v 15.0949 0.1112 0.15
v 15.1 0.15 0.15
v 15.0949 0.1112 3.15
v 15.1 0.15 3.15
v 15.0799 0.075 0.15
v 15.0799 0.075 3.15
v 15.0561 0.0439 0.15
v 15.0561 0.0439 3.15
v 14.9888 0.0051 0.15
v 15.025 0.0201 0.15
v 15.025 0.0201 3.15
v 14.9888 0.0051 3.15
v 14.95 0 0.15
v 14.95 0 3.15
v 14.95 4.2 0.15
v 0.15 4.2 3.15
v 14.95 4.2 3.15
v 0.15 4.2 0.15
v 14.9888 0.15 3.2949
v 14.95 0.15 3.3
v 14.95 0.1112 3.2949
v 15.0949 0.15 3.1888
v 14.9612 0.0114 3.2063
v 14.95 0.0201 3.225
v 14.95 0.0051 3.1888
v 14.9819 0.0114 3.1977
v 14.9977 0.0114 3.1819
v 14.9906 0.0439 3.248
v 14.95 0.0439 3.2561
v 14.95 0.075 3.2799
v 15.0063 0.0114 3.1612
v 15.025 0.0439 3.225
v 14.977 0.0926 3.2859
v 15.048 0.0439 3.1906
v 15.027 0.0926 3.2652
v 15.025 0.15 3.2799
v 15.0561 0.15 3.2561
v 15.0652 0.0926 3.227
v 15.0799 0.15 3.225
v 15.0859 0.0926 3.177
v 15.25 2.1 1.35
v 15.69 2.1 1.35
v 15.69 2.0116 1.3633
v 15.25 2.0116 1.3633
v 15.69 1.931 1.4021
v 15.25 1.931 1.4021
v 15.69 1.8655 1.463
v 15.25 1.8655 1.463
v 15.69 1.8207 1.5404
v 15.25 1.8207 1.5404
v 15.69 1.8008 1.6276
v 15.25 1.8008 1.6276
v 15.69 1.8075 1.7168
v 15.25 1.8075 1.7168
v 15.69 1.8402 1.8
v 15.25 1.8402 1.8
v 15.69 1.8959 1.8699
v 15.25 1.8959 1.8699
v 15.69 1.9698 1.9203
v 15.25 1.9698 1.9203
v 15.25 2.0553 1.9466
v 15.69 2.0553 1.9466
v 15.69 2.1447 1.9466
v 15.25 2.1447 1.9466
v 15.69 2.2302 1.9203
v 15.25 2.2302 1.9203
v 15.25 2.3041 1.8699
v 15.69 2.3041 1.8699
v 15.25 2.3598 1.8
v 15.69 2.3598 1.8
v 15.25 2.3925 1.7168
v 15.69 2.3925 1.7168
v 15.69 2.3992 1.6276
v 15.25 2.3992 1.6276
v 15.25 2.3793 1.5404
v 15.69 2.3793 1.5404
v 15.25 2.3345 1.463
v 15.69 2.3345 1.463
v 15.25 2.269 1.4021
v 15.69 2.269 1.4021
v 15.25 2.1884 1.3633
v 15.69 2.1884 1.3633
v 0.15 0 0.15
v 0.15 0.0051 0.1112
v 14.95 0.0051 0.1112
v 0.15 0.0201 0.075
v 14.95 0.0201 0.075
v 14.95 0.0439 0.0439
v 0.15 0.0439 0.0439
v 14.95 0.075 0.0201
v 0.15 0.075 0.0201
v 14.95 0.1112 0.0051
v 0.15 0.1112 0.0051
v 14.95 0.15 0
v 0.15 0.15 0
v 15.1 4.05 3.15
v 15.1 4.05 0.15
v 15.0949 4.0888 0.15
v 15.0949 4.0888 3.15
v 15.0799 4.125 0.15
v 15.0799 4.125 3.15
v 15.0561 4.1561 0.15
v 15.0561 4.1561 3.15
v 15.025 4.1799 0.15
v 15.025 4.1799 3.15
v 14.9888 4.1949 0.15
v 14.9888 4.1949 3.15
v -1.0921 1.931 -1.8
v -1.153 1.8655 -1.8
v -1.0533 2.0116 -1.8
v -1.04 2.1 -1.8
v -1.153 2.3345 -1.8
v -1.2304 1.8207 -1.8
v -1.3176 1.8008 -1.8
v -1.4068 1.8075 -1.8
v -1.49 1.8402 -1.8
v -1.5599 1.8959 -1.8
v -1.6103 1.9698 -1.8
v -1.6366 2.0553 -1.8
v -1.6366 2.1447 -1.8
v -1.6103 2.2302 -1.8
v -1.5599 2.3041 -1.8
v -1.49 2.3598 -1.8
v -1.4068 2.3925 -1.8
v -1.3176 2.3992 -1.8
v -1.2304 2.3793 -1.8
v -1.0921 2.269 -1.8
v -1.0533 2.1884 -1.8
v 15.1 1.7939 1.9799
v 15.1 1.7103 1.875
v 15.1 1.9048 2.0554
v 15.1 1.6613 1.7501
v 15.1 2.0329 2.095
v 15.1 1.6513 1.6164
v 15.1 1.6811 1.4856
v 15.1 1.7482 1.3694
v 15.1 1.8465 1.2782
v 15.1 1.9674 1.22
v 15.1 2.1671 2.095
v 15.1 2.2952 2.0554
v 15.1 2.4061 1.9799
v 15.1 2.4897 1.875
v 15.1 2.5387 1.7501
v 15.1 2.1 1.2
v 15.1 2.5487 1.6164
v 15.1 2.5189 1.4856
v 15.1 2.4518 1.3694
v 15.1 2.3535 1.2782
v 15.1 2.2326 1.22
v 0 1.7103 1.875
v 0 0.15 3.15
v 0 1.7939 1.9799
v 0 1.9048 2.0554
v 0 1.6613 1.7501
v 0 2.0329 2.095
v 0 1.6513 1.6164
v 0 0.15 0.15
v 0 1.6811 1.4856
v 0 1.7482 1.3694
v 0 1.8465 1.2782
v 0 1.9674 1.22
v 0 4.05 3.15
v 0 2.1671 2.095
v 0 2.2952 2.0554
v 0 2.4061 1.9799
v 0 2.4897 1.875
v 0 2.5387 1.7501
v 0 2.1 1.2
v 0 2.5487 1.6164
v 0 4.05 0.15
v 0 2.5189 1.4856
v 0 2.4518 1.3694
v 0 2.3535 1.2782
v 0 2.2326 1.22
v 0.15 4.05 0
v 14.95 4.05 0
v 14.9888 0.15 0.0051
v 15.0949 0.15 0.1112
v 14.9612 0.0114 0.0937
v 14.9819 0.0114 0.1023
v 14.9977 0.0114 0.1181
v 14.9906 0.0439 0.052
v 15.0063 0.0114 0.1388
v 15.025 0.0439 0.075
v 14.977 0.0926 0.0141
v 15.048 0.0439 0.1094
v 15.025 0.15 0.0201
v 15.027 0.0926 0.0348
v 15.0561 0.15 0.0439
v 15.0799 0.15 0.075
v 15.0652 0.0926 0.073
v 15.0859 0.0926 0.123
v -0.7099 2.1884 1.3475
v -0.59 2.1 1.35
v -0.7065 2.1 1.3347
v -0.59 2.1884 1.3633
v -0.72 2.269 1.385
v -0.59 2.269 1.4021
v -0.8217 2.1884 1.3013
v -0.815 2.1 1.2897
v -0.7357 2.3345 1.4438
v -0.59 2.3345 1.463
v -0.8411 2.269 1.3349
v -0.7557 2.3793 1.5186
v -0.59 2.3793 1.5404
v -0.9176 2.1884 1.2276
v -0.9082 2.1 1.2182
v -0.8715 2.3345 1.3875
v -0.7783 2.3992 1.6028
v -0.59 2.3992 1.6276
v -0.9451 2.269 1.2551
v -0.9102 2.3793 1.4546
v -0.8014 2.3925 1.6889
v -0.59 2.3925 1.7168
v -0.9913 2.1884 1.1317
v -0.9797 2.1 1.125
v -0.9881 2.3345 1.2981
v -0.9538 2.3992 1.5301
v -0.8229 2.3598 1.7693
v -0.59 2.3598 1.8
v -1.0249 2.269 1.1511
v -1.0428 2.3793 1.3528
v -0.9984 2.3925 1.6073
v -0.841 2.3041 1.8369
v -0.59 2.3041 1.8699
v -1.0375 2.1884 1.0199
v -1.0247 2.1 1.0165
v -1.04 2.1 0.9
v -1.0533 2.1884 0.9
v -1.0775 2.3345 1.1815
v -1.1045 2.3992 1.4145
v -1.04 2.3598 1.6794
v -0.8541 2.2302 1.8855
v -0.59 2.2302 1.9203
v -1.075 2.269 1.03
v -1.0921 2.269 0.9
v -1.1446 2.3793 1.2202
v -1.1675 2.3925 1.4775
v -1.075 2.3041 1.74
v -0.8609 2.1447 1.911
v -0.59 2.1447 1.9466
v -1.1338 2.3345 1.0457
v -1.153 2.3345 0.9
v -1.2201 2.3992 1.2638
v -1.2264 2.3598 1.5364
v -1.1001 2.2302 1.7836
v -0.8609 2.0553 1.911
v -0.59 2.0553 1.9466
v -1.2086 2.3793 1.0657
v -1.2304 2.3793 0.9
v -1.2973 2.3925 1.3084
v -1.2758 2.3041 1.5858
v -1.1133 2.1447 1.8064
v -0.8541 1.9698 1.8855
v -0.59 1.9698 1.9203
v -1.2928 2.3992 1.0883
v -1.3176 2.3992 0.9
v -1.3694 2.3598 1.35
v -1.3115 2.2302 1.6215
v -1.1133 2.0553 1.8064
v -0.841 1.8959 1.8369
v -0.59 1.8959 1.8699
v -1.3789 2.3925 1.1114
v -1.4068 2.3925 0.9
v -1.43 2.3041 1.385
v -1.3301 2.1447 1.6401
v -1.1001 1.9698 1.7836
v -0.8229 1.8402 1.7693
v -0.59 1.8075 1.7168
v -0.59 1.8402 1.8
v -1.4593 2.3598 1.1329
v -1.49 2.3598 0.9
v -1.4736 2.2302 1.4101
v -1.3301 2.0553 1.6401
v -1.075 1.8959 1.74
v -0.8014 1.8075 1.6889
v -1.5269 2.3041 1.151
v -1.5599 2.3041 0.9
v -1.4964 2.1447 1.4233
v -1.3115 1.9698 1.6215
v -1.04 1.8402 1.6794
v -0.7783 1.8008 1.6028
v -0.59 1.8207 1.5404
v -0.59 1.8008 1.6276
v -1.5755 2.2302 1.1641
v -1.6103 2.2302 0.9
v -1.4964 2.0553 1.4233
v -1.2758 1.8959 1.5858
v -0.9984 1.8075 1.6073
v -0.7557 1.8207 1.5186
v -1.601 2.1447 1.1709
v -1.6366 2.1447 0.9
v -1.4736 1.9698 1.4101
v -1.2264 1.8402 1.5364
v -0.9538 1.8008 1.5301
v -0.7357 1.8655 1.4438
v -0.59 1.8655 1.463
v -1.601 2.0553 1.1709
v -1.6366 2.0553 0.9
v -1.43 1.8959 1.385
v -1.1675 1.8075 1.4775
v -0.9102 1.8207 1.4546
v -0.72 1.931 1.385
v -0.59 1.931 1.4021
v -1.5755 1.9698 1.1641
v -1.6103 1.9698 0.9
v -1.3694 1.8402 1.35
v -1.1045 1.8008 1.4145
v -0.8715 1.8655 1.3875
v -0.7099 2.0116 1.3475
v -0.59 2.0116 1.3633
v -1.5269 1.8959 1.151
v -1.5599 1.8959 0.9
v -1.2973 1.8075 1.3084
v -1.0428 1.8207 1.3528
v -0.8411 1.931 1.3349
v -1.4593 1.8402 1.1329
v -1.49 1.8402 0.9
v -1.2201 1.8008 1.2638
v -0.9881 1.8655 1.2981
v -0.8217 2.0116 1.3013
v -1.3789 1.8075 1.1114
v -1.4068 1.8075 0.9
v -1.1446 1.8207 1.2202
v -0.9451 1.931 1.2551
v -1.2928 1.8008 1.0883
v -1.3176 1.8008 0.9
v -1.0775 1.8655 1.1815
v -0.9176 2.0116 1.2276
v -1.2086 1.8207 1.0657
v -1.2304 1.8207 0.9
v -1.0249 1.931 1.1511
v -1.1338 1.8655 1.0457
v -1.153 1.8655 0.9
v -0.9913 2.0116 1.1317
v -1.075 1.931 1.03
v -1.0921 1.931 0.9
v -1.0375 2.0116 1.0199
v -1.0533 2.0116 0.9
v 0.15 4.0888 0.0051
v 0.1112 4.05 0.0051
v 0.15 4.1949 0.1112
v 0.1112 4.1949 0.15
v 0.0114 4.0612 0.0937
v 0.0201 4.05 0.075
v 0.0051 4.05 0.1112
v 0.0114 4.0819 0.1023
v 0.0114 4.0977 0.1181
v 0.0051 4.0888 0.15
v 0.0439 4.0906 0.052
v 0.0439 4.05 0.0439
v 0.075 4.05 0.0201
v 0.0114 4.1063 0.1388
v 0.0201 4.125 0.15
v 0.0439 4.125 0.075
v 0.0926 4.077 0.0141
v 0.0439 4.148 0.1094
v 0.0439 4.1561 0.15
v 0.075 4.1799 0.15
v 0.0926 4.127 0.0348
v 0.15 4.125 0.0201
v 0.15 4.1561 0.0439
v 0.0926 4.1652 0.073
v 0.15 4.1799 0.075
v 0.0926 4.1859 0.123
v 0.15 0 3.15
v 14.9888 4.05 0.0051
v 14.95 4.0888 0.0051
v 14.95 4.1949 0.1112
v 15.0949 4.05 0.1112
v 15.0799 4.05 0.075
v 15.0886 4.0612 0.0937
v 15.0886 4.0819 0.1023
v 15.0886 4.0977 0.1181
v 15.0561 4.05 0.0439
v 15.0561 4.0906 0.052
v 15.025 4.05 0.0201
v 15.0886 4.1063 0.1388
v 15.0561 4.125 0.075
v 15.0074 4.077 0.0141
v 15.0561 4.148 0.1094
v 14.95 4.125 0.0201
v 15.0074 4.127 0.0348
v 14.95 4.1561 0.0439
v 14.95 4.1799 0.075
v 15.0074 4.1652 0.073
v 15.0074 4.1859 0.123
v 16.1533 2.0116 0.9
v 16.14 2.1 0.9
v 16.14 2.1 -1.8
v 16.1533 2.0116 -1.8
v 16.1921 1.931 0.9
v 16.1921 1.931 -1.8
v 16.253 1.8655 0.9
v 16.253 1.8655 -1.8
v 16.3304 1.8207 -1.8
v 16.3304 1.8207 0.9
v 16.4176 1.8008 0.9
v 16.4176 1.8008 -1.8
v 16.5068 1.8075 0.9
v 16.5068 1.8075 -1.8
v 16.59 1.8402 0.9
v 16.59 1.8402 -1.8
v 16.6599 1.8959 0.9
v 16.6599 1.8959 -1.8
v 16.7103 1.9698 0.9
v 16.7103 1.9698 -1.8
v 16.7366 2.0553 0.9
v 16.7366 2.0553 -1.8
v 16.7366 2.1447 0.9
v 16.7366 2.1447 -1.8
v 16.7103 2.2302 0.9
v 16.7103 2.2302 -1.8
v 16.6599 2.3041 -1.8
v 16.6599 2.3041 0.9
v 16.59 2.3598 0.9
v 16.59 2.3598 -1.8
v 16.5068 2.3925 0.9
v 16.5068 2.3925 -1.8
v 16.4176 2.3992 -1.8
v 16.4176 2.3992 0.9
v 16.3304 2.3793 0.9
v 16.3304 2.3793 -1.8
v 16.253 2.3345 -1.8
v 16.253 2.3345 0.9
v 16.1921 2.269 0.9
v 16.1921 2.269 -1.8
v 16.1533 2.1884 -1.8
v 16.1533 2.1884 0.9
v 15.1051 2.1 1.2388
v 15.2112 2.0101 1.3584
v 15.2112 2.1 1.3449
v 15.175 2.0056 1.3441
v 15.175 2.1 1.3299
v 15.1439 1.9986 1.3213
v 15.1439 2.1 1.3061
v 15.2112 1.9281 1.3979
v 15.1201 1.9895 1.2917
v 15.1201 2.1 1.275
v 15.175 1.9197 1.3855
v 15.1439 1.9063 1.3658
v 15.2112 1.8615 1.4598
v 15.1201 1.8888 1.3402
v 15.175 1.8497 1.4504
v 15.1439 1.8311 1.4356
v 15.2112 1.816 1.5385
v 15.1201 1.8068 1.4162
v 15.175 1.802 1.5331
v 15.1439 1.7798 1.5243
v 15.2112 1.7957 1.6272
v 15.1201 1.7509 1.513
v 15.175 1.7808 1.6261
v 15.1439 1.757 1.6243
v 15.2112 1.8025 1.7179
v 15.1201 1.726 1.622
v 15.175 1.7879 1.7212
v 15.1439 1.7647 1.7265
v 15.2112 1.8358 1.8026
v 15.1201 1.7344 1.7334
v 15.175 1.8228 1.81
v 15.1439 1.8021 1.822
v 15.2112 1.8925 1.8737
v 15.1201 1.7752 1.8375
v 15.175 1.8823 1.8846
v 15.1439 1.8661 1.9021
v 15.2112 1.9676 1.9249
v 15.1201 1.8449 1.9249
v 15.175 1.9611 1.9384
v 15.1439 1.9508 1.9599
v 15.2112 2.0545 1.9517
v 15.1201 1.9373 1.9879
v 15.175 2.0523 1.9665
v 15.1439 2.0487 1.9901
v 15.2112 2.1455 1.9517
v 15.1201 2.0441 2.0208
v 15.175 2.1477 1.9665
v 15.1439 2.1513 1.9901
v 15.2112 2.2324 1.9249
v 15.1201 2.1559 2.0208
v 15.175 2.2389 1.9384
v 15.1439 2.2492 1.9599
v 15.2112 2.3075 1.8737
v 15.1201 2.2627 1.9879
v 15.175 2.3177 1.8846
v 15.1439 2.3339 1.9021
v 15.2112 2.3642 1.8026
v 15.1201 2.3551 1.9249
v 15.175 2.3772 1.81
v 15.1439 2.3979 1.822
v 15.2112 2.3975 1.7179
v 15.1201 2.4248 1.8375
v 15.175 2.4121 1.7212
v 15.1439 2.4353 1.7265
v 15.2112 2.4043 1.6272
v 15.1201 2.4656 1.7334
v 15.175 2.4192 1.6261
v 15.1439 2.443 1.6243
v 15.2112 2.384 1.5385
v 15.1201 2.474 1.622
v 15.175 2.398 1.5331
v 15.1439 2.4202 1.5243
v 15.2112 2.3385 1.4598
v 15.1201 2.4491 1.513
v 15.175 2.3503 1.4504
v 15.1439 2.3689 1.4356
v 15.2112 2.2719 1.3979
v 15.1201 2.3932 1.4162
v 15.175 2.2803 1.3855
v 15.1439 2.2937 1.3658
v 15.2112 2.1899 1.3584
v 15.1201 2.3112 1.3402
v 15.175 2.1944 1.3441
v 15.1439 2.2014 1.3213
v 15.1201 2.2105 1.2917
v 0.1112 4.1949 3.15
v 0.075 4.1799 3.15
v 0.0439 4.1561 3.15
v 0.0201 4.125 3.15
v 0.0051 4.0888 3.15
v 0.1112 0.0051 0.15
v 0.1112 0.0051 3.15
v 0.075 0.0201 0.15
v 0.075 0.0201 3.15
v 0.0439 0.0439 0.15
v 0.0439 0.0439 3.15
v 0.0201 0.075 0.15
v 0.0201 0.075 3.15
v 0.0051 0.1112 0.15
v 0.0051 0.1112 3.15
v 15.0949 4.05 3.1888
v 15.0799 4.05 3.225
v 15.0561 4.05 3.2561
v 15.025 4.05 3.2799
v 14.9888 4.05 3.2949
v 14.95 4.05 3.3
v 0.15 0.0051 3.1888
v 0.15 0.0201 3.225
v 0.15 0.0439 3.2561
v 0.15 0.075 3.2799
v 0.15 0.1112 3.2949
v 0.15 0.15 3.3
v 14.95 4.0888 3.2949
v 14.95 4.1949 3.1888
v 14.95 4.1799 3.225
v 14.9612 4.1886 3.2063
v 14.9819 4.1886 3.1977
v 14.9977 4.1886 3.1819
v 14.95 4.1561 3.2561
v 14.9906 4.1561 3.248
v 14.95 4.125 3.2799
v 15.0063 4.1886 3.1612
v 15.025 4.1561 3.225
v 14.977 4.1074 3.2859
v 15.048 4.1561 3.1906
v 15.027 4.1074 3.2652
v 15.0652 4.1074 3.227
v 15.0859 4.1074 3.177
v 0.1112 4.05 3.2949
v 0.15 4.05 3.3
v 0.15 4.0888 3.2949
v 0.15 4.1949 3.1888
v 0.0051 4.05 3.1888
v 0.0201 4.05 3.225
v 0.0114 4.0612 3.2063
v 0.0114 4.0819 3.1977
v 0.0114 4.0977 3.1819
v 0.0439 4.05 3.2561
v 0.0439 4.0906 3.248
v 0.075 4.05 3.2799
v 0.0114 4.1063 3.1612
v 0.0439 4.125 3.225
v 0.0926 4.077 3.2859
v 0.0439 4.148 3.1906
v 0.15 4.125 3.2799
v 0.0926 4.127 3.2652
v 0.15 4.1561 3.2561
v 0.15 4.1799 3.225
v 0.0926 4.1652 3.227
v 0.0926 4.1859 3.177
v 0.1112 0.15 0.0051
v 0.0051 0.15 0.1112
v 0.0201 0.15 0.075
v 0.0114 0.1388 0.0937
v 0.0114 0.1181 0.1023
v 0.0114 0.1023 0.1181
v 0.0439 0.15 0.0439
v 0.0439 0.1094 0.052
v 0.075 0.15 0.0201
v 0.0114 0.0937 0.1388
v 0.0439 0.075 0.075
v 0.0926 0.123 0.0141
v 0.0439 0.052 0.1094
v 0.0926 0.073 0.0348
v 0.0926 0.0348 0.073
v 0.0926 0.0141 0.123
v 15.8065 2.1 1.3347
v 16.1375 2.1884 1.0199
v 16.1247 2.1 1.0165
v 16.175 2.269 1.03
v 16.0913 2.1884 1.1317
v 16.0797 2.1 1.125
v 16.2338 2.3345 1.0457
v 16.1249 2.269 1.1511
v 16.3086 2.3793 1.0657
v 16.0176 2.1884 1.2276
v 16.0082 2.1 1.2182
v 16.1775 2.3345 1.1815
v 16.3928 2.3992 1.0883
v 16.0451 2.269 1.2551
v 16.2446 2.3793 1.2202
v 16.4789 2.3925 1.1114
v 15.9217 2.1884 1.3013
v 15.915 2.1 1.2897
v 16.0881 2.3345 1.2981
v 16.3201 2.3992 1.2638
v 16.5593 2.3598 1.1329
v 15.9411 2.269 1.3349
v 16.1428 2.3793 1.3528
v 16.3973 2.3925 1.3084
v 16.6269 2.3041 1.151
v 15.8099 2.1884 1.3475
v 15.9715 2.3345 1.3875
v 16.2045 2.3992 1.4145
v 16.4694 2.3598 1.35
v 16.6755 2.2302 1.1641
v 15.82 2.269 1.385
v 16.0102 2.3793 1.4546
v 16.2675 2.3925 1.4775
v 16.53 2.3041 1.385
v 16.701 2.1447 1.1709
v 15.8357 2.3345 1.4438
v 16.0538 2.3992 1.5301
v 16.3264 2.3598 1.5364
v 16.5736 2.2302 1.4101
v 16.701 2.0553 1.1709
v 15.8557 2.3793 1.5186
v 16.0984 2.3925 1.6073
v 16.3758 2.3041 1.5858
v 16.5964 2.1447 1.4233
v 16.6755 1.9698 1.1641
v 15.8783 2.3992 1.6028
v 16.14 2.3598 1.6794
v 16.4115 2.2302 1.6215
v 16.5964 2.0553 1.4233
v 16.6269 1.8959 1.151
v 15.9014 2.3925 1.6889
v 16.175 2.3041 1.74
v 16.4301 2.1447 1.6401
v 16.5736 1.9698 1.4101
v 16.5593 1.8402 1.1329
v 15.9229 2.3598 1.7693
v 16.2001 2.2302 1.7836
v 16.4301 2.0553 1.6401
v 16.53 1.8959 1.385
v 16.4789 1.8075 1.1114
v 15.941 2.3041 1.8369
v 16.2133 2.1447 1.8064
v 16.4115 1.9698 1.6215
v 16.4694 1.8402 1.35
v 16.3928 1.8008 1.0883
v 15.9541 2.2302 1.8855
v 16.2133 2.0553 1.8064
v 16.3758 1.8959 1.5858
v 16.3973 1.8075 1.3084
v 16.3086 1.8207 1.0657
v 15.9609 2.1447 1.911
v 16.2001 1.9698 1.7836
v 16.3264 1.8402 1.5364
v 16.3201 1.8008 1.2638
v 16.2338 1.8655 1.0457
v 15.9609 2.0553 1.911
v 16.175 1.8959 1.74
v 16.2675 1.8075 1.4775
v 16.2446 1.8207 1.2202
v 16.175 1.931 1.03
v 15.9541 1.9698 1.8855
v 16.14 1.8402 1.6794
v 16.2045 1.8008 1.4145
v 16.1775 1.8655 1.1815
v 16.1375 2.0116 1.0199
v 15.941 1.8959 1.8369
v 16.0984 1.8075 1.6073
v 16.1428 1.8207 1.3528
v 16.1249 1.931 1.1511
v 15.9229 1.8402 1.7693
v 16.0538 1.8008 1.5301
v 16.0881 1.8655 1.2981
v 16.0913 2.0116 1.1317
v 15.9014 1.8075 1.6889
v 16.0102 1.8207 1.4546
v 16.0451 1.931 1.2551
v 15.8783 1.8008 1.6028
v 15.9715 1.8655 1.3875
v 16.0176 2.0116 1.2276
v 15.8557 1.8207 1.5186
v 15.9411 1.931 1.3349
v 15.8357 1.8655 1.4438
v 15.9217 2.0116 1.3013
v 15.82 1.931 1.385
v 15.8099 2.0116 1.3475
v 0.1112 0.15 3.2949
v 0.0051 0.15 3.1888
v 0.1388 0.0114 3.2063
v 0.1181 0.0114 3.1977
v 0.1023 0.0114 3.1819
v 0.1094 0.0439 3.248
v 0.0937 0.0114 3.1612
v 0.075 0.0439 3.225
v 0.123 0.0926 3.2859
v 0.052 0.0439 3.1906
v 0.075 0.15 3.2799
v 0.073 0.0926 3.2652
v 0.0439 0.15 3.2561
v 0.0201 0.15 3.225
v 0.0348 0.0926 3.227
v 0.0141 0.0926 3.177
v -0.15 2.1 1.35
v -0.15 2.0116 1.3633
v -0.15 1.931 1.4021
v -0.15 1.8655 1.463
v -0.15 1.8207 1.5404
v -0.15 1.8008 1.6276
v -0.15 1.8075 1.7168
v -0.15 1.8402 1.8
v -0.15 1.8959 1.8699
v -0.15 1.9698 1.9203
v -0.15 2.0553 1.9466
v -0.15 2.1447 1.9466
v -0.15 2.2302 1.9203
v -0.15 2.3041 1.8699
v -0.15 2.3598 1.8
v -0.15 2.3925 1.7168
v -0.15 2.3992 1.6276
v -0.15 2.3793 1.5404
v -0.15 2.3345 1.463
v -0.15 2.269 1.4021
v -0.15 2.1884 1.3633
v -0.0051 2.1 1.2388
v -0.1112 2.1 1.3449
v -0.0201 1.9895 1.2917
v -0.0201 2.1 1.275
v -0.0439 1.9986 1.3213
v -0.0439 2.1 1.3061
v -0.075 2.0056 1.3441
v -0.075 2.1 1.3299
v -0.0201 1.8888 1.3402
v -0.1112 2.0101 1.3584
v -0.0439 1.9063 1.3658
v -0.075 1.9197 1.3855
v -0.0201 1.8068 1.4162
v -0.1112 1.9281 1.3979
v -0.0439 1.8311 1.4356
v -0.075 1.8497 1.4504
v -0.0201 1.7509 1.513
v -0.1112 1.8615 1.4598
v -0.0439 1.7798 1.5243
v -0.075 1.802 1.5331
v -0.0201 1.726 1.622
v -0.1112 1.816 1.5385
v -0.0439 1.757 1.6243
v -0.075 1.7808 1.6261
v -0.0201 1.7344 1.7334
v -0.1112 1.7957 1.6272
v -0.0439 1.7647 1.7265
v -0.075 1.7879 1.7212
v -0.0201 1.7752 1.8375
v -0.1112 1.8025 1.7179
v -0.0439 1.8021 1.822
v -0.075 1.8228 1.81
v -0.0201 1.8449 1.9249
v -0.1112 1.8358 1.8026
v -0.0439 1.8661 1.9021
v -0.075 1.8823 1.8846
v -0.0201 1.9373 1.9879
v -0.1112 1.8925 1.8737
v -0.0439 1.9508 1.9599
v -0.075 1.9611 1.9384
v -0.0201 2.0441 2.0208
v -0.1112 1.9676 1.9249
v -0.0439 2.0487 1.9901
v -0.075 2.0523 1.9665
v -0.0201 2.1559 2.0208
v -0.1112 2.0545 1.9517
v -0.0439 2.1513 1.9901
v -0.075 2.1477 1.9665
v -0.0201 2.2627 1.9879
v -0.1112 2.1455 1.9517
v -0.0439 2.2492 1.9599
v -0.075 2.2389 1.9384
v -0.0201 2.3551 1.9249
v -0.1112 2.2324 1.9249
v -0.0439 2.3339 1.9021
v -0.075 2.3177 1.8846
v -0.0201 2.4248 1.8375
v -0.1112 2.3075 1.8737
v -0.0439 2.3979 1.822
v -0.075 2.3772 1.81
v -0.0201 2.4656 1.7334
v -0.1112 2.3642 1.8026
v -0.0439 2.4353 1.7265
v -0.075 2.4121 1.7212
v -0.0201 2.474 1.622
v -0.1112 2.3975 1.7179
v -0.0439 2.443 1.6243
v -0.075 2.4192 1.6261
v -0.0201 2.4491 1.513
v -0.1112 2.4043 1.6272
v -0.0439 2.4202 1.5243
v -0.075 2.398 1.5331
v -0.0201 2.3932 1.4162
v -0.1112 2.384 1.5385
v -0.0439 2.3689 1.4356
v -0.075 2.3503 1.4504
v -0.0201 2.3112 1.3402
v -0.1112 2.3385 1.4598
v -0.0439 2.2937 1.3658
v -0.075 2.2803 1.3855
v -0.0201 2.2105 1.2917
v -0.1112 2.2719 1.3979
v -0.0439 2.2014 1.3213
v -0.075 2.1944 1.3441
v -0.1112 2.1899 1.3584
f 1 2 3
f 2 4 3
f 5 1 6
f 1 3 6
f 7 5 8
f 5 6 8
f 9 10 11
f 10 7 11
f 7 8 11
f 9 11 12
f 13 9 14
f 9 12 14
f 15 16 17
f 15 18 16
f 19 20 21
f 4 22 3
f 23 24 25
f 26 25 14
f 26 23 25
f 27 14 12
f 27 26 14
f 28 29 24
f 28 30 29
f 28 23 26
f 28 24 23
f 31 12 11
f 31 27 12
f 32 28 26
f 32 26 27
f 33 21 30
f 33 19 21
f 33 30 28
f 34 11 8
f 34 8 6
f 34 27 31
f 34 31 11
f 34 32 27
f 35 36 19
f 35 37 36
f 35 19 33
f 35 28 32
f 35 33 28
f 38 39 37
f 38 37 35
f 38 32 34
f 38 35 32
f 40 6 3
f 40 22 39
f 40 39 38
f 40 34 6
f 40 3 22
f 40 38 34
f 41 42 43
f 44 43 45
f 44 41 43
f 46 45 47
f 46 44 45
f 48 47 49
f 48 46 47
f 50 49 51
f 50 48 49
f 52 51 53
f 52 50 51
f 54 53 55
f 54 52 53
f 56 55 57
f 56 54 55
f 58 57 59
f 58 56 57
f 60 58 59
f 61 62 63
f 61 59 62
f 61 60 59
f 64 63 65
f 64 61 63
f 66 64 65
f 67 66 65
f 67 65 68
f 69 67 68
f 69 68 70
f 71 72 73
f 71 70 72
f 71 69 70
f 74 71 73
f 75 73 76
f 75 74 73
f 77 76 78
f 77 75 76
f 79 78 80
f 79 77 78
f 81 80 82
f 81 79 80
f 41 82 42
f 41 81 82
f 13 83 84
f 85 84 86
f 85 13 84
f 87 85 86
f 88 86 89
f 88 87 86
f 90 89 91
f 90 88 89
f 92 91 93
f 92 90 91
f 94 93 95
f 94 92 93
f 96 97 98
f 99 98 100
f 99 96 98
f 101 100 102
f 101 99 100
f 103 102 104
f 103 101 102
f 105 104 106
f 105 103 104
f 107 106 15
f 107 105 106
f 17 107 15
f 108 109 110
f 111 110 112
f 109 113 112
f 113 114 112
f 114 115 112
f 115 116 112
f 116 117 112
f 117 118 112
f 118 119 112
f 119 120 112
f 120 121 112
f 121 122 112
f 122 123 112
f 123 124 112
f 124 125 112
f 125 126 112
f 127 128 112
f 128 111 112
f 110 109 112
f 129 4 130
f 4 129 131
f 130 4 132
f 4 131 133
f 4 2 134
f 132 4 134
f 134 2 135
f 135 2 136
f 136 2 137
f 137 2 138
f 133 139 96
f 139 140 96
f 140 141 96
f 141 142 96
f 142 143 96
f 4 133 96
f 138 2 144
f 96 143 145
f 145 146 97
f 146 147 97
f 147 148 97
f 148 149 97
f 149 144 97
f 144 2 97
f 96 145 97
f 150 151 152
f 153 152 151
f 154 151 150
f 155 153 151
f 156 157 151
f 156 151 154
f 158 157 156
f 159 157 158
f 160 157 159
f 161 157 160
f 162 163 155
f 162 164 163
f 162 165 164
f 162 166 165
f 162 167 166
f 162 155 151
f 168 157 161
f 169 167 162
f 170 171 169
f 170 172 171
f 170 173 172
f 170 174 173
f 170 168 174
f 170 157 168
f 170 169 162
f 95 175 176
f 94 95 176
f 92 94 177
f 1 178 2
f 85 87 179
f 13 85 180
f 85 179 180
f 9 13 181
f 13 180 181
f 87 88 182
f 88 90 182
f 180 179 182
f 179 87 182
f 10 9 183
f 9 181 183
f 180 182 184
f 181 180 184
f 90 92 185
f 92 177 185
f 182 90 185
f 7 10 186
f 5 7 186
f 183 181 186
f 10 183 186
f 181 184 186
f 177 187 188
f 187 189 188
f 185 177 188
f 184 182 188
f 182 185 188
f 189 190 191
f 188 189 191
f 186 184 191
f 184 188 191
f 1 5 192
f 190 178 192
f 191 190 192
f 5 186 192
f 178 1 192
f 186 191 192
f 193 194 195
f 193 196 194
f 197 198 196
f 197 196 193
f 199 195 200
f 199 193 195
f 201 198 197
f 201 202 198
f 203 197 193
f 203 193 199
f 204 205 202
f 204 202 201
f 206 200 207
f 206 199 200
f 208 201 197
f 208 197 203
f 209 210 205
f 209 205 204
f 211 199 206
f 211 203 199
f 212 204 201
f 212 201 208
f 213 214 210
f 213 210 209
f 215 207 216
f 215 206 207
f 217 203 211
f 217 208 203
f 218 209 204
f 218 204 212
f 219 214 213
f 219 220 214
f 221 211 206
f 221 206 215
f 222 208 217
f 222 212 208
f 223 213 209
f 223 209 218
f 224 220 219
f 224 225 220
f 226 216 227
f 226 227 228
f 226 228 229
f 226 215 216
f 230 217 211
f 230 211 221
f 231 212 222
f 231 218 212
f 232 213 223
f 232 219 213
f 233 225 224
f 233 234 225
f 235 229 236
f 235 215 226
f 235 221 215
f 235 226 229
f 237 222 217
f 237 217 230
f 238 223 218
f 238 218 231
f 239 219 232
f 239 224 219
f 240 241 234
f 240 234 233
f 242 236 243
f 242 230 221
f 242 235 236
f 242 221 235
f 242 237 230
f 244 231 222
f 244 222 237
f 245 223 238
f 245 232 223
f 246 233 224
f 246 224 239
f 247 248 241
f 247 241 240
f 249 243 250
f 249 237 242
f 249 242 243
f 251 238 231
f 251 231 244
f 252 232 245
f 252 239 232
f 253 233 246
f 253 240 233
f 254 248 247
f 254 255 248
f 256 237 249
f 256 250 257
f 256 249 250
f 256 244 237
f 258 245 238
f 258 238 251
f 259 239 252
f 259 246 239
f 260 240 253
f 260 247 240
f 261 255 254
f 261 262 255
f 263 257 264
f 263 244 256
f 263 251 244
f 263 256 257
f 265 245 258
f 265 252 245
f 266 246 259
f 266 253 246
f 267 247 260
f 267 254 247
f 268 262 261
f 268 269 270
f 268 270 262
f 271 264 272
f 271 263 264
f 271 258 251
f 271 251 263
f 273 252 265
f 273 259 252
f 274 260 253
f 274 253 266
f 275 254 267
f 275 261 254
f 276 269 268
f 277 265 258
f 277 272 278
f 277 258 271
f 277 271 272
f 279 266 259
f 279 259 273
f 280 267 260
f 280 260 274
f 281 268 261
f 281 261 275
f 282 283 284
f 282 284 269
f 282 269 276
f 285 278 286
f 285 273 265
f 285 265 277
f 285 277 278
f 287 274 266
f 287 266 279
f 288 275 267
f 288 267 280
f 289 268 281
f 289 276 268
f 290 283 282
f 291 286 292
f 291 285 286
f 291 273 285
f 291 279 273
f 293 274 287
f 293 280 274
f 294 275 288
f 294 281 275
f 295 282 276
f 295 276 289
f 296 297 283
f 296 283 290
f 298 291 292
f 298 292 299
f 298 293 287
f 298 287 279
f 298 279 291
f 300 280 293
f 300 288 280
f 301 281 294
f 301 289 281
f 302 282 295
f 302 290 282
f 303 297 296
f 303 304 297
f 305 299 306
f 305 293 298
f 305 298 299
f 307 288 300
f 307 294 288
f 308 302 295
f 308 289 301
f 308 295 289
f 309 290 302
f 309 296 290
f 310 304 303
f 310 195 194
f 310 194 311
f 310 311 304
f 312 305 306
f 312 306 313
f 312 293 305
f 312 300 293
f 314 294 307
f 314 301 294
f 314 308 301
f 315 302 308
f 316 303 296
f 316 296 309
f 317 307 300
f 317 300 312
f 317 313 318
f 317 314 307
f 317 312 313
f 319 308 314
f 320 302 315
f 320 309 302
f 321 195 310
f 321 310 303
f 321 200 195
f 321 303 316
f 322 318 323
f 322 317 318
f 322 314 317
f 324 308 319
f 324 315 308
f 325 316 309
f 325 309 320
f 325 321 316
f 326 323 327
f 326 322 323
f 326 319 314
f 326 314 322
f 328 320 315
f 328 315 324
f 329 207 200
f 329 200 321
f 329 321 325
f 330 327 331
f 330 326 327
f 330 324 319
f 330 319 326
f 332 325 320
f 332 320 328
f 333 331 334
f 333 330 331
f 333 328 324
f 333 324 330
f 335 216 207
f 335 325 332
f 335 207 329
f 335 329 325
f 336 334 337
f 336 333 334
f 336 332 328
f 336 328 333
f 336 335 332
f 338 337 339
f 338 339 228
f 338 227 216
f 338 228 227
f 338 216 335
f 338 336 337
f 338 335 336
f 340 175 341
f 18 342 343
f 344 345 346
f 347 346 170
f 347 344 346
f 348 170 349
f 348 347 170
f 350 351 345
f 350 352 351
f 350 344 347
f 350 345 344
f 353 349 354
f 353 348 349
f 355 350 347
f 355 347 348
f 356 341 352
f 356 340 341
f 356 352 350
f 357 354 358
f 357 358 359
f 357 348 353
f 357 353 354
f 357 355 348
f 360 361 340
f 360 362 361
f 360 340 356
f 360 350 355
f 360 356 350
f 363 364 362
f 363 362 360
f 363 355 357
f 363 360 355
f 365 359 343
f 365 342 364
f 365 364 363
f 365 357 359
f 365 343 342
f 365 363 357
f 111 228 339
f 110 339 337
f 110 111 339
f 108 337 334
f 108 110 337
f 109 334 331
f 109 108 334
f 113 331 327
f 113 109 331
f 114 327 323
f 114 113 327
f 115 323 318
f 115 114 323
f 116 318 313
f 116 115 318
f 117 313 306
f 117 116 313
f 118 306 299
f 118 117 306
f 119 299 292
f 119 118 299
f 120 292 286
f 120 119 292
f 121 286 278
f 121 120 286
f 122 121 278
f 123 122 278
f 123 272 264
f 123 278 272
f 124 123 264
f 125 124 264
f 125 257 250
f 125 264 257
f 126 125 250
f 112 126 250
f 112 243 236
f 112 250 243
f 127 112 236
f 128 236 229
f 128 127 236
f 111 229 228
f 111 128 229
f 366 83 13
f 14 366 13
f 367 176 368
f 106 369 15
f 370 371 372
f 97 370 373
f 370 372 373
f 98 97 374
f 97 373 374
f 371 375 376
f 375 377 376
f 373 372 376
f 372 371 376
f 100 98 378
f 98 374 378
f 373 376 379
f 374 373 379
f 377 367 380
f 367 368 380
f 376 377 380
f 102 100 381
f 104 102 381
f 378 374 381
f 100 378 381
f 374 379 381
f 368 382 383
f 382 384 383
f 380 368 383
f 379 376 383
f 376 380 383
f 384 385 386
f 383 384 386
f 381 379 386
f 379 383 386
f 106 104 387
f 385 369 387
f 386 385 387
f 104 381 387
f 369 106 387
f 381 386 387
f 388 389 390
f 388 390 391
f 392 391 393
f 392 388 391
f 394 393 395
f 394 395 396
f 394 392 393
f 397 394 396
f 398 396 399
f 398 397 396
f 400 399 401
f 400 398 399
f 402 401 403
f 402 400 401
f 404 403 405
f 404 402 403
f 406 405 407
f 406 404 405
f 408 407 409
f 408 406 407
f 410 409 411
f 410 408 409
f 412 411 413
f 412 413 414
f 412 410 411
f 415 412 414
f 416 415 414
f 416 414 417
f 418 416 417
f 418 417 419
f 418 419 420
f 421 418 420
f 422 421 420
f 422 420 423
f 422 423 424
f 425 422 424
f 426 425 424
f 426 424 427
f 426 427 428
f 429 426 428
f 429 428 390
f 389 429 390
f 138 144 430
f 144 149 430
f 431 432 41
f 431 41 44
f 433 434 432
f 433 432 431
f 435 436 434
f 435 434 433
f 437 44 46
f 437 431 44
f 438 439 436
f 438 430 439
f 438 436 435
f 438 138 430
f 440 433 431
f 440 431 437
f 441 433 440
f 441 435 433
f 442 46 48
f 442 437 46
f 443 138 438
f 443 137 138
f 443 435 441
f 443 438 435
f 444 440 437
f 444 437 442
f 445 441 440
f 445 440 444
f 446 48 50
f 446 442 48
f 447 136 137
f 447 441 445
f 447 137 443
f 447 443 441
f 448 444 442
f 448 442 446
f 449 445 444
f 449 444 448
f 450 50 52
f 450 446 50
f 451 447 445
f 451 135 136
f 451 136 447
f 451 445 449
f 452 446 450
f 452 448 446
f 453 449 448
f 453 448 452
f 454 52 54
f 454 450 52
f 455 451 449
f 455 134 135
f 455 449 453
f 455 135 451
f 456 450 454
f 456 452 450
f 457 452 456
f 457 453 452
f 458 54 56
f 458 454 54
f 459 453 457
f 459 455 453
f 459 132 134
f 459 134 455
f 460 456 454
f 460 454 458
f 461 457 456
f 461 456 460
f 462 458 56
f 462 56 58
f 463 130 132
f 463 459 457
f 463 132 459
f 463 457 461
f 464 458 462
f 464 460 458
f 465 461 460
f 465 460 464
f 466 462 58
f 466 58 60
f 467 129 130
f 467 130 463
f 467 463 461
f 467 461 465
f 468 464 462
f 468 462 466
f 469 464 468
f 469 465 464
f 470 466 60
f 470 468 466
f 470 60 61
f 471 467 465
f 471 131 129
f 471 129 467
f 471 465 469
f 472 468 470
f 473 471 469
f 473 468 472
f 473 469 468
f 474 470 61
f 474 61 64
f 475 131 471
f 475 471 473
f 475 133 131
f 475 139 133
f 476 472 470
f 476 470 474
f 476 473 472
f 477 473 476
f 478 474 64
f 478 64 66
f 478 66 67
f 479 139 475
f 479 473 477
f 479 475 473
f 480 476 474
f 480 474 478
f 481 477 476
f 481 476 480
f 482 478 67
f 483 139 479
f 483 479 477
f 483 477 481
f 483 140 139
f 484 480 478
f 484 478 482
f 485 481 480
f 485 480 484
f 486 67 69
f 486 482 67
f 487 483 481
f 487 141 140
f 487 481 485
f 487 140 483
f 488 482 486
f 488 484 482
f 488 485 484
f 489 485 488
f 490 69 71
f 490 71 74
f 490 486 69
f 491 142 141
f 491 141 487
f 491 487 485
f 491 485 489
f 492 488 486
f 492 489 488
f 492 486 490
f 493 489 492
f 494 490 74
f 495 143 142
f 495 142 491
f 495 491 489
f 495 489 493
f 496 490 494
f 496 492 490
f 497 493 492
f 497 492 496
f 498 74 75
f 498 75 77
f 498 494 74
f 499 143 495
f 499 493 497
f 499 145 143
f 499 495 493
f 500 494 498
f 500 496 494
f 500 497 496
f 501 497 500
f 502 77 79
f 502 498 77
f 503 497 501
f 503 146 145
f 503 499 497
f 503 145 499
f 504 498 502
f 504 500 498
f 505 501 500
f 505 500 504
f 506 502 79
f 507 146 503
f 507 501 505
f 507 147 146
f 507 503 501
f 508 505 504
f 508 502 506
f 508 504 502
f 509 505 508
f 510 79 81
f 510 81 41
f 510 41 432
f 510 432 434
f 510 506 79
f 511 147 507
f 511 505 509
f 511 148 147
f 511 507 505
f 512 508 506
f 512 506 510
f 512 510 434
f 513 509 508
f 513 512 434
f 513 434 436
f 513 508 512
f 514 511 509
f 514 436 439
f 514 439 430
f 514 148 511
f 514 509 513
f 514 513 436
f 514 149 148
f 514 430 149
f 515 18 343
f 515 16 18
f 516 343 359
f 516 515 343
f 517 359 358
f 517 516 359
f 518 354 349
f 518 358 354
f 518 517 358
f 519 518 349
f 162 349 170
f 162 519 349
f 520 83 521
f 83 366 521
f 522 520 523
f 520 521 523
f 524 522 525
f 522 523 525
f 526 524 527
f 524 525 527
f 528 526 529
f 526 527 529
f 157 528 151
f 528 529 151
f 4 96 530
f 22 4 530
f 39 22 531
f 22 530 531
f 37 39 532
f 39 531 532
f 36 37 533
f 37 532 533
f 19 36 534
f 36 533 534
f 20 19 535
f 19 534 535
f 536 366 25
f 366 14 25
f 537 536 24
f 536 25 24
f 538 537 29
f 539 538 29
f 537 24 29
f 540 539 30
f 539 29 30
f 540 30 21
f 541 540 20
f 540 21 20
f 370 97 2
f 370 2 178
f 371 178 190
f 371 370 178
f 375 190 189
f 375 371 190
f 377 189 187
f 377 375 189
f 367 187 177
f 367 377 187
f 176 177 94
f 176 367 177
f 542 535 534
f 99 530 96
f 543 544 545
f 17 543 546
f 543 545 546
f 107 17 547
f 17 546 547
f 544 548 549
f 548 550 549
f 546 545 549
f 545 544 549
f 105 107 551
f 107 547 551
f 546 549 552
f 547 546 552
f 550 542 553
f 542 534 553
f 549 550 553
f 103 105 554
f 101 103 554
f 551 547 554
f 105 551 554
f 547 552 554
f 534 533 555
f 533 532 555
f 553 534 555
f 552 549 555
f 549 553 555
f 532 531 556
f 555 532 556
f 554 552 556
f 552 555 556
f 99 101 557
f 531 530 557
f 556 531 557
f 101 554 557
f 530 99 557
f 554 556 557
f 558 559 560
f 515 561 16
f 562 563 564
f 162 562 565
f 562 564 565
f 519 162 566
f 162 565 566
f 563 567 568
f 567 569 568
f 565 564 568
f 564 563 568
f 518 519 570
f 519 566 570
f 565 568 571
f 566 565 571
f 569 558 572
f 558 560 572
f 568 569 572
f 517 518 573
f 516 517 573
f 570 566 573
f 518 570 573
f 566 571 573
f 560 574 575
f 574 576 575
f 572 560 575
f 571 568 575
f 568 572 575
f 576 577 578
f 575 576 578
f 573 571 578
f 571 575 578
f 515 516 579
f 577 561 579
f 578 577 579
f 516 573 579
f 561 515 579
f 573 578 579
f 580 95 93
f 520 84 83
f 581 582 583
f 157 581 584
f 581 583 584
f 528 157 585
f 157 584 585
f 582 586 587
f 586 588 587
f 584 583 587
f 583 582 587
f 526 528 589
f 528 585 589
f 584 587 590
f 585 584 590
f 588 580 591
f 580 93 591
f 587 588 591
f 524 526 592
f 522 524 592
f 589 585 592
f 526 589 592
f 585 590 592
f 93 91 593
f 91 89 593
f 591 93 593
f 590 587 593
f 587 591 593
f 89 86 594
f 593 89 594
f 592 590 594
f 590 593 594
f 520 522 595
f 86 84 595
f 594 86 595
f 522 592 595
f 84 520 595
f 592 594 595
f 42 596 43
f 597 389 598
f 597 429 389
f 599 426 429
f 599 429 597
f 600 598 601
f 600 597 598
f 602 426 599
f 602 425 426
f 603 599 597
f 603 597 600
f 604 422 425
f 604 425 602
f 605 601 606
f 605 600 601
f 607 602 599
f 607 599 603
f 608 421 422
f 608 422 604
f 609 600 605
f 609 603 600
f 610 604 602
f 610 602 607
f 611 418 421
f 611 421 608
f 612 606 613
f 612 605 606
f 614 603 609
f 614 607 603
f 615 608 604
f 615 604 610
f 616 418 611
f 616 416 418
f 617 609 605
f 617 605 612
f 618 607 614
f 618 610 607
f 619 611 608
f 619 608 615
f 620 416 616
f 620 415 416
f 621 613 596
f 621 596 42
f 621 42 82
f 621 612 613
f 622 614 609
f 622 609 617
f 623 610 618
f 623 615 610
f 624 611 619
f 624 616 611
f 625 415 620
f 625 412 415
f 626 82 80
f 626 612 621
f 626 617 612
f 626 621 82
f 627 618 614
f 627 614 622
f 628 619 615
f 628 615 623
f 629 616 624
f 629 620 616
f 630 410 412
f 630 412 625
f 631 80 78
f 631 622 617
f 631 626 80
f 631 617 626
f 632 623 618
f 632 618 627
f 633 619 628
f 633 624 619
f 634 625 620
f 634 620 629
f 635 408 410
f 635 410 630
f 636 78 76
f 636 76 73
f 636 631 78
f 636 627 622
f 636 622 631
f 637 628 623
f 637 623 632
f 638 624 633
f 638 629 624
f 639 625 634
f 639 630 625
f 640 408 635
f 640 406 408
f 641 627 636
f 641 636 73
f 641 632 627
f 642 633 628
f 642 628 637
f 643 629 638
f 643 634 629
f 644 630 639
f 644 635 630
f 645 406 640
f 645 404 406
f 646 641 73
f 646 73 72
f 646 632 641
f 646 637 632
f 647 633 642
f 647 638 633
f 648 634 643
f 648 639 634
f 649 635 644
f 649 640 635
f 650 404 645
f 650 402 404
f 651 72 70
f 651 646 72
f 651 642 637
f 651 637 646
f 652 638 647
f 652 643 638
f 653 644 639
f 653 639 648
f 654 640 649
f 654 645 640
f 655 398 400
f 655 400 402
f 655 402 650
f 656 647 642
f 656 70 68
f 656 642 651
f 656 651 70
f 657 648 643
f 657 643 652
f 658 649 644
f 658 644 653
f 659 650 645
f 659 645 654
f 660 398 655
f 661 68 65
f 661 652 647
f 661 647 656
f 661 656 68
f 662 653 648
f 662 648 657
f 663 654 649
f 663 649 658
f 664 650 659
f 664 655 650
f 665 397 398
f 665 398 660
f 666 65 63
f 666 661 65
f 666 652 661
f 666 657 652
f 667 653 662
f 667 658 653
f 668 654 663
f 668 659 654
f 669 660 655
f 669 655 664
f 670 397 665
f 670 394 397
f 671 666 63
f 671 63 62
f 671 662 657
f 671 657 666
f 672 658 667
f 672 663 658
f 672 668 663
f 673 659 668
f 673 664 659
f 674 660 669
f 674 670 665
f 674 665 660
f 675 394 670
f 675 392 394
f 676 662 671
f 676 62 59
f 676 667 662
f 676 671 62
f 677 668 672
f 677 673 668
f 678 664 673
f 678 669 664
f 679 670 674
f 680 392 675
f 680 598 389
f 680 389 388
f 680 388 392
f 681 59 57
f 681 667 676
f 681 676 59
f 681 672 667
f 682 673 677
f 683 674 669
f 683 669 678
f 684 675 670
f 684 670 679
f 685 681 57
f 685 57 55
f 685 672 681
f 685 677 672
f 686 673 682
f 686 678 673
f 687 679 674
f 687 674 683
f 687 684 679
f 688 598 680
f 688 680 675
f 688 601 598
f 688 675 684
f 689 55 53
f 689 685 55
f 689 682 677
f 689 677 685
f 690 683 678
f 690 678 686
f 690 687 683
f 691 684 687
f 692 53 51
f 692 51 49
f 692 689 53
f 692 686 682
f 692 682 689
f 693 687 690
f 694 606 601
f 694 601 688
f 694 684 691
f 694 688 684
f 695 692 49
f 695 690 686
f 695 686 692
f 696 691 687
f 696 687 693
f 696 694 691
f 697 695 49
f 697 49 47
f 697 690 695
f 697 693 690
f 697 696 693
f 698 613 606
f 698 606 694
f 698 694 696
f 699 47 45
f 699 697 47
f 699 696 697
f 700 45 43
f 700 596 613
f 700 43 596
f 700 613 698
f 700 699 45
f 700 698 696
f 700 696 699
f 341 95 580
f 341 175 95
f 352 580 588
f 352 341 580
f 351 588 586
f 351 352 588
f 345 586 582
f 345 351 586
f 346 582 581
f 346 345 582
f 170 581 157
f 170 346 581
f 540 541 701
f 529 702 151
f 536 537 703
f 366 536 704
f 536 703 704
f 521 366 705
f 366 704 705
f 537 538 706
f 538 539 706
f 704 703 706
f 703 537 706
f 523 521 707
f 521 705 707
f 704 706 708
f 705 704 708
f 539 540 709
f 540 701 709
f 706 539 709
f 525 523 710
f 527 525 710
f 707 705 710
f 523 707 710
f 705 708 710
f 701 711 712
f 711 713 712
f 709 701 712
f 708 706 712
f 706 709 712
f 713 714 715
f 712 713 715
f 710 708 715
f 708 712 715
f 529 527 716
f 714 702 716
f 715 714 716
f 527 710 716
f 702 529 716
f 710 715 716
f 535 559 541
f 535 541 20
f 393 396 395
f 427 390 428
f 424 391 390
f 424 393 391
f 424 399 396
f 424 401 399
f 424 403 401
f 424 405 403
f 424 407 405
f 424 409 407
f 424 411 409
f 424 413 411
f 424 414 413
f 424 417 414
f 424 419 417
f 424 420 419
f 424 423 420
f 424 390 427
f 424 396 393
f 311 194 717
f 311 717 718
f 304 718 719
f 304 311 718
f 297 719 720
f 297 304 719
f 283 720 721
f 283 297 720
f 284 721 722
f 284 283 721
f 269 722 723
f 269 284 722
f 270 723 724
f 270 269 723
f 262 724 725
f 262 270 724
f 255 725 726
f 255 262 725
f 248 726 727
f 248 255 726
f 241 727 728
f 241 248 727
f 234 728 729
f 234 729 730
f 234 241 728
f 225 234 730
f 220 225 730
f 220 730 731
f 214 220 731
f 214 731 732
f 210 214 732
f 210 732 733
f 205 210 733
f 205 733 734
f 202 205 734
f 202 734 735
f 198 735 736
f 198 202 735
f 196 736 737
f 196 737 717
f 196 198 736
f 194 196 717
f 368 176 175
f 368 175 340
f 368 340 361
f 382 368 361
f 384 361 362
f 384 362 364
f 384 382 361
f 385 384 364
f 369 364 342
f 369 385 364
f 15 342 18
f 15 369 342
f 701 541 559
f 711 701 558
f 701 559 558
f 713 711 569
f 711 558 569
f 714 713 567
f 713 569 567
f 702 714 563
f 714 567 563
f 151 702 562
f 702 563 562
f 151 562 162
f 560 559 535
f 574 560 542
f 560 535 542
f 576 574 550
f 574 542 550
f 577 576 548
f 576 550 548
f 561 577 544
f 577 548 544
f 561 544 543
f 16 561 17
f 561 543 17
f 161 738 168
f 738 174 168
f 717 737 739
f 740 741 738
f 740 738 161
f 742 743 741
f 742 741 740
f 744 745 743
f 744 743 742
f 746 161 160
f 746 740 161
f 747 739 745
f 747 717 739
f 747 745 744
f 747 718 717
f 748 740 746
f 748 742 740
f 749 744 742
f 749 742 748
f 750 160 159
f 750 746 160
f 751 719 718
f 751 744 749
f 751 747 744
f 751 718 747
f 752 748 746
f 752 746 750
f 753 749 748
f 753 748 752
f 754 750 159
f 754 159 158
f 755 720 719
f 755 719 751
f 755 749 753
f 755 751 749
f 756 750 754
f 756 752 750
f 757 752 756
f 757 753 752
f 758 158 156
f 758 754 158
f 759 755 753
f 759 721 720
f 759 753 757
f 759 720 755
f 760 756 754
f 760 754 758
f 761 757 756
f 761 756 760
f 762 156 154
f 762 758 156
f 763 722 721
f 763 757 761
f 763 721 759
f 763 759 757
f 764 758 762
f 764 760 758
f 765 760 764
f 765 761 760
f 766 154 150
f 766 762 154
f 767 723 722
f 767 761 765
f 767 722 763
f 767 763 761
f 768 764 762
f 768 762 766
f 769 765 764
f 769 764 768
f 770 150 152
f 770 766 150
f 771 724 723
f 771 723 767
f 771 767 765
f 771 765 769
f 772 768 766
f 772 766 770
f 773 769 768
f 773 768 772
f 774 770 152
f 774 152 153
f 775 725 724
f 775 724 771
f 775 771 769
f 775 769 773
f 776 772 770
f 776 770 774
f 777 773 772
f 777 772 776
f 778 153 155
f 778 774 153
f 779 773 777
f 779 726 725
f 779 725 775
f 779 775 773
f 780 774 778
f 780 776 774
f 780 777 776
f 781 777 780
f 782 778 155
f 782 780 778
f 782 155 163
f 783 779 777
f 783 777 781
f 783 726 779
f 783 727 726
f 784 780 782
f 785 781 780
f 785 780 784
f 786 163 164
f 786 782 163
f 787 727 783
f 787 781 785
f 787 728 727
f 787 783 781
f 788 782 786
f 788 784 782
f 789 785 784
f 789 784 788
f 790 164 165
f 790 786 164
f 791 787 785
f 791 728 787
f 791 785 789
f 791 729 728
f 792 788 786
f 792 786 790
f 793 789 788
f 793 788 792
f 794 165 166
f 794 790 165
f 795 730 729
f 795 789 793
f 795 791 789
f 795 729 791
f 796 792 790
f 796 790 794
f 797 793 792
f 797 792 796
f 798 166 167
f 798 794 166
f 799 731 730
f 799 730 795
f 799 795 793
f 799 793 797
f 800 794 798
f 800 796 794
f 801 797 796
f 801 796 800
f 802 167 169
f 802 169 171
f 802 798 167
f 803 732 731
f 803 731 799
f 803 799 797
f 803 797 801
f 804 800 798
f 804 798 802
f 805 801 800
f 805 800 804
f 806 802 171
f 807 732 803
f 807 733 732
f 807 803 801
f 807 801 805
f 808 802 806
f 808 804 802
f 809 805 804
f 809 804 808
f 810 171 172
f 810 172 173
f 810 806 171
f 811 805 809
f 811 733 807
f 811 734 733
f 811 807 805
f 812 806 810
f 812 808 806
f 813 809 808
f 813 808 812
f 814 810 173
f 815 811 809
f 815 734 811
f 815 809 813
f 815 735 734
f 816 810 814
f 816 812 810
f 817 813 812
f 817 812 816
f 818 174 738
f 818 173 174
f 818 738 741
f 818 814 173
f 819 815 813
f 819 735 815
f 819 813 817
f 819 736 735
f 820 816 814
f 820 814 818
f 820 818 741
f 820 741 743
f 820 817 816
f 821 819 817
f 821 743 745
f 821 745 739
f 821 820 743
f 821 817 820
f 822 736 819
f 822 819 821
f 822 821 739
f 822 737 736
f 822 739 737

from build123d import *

# Parameters (mm, degrees)
SKETCH1_W           = 15.1
SKETCH1_H           = 4.2
BOSS_EXTRUDE1_DEPTH = 3.3
SKETCH5_R           = 0.3
FILLET1_R           = 0.15


with BuildPart() as part:
    # Sketch1 → Boss-Extrude1 (new body)
    with BuildSketch(Plane.XY):
        with Locations((7.55, 2.1)):
            Rectangle(SKETCH1_W, SKETCH1_H)
    extrude(amount=BOSS_EXTRUDE1_DEPTH)

    # Sweep3: sweep along a path in Sketch2
    with BuildLine(Plane(origin=(0, 2.1, 0), x_dir=(1, 0, 0), z_dir=(0, 1, 0))) as sweep3_path:
        Line((16.44, 1.8), (16.44, -0.9))
        ThreePointArc((16.44, -0.9), (16.220330086, -1.430330086), (15.69, -1.65))
        Line((15.69, -1.65), (15.1, -1.65))
        Line((15.1, -1.65), (0, -1.65))
        Line((0, -1.65), (-0.59, -1.65))
        ThreePointArc((-0.59, -1.65), (-1.120330086, -1.430330086), (-1.34, -0.9))
        Line((-1.34, -0.9), (-1.34, 1.8))
    # Sketch5 → Sweep3 (sweep)
    with BuildSketch(Plane.XY.offset(-1.8)):
        with Locations((-1.34, 2.1)):
            Circle(SKETCH5_R)
    sweep(path=sweep3_path.line)

    # Fillet1
    fillet1_edges = [part.edges().sort_by_distance(p)[0] for p in [
        (15.1, 2.1, 3.3),
        (7.55, 4.2, 3.3),
        (0, 2.1, 1.95),
        (15.1, 2.1, 1.95),
        (0, 2.1, 3.3),
        (7.55, 4.2, 0),
        (15.1, 2.1, 0),
        (7.55, 0, 0),
        (0, 2.1, 0),
        (7.55, 0, 3.3),
        (0, 4.2, 1.65),
        (15.1, 4.2, 1.65),
        (15.1, 0, 1.65),
        (0, 0, 1.65),
    ]]
    fillet(fillet1_edges, radius=FILLET1_R)


solid = part.part
